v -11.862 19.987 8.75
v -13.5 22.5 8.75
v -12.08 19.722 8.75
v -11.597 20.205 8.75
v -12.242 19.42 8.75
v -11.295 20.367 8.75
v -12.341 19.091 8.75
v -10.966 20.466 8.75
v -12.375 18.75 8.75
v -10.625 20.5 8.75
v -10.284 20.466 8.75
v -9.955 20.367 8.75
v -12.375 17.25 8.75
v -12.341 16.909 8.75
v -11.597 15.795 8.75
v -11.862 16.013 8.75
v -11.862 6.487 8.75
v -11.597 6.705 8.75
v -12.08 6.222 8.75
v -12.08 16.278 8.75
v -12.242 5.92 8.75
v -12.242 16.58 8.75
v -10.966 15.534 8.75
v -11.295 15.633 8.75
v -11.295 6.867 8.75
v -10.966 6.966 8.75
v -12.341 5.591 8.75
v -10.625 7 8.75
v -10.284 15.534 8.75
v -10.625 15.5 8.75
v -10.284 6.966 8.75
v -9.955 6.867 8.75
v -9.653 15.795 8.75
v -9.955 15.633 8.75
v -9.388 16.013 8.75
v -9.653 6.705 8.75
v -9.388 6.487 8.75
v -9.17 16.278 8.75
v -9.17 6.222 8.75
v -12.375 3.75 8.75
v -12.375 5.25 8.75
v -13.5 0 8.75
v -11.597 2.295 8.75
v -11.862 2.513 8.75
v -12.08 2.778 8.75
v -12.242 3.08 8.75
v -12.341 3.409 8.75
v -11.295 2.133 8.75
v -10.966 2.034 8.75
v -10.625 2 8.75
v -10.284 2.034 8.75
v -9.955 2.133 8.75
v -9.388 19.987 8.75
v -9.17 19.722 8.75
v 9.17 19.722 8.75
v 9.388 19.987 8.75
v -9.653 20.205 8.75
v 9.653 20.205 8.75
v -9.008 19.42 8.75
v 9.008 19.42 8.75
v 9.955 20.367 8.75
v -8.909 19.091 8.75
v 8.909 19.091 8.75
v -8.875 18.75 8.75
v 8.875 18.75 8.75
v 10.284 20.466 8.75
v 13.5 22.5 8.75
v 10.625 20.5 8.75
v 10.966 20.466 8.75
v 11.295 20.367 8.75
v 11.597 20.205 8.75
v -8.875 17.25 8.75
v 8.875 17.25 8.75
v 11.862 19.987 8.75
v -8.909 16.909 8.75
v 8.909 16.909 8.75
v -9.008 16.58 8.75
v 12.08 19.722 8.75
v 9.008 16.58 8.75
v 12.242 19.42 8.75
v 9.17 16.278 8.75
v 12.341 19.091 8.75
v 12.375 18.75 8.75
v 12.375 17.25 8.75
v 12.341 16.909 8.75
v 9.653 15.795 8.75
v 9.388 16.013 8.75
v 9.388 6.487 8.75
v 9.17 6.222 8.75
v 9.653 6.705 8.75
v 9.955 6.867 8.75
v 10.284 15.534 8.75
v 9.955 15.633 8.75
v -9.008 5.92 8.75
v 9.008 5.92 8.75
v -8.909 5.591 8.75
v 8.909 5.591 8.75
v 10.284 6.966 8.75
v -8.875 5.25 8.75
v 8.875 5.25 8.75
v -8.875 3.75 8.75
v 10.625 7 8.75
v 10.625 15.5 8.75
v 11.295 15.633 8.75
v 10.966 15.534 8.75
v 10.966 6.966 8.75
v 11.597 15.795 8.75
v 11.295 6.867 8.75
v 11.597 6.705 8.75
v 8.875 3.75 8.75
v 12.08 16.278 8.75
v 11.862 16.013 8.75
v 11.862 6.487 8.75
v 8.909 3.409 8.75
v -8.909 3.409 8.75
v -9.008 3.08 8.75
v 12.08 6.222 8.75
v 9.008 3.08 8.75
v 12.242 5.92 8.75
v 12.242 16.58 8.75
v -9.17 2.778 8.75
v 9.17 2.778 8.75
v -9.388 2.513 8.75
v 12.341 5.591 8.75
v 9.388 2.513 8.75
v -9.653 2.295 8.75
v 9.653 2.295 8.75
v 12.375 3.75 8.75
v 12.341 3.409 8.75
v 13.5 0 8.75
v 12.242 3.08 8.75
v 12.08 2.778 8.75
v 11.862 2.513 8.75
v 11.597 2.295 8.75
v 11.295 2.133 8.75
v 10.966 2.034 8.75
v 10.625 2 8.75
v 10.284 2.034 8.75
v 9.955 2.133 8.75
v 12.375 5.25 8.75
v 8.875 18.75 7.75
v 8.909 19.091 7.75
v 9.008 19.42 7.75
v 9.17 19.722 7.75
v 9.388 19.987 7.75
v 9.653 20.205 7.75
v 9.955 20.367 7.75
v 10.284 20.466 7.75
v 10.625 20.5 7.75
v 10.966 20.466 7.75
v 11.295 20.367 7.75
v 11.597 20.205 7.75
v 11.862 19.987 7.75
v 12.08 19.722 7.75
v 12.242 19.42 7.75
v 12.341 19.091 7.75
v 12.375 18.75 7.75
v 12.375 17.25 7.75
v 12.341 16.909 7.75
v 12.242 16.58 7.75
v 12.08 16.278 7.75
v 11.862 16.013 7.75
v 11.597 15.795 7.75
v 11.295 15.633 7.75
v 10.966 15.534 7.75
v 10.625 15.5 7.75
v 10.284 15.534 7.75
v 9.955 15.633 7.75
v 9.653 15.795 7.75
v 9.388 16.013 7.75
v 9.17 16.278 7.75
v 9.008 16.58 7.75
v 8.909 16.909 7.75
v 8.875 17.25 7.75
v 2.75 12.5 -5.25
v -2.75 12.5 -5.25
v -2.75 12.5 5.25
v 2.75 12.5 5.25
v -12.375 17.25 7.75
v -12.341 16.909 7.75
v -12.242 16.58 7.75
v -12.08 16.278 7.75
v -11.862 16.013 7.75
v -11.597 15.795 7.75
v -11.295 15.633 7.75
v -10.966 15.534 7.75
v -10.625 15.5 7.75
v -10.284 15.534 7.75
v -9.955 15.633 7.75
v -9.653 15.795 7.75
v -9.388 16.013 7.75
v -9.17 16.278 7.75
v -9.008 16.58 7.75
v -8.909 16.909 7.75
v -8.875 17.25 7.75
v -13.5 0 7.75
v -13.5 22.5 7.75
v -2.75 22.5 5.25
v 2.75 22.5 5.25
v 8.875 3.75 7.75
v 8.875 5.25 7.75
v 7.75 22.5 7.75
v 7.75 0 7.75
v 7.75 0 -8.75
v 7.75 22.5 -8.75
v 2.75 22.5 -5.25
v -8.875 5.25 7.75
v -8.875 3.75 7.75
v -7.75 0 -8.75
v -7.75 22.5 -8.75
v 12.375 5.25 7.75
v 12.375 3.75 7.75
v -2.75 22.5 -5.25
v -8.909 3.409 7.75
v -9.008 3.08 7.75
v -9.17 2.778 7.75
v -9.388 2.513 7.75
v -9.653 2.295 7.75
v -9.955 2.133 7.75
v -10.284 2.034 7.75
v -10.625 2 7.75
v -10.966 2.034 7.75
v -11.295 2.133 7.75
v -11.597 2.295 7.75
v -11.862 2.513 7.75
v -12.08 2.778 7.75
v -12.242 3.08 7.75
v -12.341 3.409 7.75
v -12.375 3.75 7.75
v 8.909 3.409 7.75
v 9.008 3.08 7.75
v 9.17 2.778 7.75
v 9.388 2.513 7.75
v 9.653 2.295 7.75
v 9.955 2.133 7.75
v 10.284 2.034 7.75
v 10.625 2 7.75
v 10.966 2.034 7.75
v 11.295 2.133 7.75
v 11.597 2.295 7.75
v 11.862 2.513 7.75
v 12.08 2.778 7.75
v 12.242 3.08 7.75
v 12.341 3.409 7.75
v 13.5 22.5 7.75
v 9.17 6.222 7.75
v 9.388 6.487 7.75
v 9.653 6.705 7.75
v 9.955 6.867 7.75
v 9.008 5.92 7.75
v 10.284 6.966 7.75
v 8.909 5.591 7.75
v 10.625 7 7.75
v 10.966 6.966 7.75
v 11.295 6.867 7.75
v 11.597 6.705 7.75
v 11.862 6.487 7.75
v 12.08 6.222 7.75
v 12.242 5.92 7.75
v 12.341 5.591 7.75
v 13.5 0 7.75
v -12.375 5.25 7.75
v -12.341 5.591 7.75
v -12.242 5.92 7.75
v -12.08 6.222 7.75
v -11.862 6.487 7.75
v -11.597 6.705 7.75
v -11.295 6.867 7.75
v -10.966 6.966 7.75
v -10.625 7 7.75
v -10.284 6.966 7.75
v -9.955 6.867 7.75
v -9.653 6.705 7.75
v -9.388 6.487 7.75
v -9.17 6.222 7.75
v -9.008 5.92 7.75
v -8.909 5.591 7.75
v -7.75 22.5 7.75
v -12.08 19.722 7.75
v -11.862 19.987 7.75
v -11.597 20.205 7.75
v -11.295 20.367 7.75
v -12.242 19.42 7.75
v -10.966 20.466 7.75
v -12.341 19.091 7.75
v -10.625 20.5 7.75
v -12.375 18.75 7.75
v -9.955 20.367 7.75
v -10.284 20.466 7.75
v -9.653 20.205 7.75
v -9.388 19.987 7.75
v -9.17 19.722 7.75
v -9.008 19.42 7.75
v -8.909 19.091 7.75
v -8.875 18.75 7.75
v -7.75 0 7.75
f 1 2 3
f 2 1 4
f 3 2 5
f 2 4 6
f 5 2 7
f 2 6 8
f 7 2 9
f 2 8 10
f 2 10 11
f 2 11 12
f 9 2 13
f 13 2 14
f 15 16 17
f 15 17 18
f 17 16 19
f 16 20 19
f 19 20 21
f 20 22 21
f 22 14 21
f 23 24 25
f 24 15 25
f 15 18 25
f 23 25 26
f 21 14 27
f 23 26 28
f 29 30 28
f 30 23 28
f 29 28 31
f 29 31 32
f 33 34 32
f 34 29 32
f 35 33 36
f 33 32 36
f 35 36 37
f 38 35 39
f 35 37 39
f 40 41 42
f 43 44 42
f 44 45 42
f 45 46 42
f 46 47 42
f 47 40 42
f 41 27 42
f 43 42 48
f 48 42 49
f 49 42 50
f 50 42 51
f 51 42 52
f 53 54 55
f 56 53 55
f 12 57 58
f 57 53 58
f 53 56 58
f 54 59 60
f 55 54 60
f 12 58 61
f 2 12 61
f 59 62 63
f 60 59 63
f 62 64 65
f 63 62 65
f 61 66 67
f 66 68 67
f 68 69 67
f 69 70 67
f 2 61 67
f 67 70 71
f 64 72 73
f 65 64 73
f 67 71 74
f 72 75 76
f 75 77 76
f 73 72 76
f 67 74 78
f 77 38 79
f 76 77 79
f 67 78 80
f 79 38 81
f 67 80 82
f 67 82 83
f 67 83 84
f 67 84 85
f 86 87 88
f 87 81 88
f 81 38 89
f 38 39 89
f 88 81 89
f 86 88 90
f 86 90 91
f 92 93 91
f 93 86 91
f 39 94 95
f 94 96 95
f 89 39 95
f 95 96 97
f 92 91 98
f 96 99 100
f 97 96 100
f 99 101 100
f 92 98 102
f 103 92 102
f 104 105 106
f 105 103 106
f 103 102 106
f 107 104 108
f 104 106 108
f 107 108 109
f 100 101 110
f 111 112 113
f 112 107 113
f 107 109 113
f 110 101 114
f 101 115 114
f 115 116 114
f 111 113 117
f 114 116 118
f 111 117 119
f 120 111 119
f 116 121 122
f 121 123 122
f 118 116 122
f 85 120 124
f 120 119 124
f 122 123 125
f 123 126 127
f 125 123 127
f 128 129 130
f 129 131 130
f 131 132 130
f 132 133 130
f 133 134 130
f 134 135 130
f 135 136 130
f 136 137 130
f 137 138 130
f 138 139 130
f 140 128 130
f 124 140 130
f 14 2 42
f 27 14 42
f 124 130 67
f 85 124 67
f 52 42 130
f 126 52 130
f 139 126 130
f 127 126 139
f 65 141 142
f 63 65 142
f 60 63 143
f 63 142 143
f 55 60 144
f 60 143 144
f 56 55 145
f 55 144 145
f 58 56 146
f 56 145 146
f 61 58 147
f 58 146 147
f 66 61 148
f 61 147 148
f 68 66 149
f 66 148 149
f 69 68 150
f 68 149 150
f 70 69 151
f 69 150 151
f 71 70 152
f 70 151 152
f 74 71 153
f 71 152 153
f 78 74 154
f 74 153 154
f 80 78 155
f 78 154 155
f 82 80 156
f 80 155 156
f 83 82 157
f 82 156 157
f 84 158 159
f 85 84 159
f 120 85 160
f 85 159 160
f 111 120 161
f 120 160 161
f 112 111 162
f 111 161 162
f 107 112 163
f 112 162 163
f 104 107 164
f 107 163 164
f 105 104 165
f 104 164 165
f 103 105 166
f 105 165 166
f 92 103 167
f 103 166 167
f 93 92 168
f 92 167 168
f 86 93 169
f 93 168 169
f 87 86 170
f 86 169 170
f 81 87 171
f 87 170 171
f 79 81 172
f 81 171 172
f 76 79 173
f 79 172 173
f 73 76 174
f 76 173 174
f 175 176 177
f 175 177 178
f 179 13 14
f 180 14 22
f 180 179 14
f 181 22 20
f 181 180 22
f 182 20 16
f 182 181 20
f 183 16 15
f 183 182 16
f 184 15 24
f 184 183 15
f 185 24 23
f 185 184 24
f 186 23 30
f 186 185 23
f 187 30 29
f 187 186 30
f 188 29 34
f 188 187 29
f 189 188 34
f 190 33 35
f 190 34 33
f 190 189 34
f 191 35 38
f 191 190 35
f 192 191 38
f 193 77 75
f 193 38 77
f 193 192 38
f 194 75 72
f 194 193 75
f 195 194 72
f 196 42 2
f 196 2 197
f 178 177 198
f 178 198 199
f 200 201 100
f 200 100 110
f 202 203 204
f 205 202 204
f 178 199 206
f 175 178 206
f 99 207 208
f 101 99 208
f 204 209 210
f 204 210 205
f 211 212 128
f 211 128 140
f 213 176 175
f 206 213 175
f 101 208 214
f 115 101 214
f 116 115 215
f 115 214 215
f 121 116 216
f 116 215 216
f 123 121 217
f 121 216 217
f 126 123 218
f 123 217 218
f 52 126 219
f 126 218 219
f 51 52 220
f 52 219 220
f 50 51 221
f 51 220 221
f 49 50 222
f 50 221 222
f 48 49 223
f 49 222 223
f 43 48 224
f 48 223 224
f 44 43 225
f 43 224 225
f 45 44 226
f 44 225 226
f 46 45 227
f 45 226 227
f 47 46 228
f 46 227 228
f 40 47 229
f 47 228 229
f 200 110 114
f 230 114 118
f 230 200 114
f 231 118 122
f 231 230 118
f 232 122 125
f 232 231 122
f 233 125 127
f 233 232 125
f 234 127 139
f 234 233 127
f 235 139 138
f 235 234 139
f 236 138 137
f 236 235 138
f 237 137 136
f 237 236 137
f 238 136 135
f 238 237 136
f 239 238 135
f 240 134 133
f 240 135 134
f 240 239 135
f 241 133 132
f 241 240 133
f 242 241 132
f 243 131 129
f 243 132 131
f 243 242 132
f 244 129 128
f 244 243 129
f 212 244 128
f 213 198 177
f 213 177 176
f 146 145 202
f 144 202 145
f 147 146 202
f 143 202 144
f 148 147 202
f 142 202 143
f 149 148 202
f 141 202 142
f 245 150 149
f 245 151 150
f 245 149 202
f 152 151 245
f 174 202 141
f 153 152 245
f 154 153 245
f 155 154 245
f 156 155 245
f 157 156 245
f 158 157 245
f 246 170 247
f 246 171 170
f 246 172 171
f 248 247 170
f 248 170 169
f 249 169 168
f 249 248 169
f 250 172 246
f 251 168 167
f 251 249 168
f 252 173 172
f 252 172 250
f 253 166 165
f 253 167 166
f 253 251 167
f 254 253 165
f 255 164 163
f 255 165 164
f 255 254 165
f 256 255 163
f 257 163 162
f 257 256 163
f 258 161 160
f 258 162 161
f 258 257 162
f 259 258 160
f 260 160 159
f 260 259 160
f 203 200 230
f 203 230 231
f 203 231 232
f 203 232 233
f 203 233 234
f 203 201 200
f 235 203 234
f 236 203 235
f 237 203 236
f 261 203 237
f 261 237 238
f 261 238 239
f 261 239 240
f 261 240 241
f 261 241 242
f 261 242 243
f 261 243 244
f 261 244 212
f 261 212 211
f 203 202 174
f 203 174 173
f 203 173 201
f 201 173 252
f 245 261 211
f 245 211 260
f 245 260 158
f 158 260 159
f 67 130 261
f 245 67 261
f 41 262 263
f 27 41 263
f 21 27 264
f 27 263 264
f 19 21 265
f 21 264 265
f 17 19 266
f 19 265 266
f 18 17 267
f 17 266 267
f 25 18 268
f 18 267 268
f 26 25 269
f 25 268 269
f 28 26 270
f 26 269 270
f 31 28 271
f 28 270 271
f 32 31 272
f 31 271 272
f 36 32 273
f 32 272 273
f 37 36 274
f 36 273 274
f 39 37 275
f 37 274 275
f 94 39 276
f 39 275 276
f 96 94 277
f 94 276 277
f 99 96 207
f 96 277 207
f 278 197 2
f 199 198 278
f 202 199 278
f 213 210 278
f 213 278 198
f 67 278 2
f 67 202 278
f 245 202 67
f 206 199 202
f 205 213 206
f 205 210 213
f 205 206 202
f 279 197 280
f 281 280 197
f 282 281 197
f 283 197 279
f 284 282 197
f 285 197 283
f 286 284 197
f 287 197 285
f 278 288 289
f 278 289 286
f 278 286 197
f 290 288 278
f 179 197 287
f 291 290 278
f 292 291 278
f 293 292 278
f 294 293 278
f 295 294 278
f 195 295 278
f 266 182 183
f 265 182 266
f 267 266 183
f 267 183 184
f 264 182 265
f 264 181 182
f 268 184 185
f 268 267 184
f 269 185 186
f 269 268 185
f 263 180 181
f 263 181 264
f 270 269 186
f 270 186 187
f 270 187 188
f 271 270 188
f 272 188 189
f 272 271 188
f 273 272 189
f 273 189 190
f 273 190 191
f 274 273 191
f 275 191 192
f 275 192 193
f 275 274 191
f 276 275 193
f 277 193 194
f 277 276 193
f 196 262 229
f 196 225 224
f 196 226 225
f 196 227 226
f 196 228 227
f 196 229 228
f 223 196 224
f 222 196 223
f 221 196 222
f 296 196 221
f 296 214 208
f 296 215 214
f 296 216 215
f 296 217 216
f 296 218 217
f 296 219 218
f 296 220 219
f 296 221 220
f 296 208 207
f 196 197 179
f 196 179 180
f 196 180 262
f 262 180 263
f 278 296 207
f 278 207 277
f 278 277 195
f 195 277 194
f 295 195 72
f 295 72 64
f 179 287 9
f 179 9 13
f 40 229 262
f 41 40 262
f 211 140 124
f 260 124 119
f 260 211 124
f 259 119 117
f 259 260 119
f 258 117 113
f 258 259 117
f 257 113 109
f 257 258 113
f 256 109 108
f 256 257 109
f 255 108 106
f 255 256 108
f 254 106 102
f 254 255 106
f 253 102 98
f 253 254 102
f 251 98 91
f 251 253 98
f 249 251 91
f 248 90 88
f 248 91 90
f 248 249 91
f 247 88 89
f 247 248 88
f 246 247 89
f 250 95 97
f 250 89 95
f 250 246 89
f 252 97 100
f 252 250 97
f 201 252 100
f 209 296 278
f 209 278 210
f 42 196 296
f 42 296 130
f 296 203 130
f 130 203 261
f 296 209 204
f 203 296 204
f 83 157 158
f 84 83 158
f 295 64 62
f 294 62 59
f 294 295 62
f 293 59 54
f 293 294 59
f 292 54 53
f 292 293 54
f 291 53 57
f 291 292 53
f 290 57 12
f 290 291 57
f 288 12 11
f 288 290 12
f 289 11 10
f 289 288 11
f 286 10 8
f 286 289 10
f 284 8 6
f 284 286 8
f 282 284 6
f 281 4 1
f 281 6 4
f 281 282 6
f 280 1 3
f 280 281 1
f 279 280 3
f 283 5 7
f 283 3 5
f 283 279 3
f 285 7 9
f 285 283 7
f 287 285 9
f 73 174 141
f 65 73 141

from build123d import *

# Parameters (mm, degrees)
SKETCH1_W            = 15.5
SKETCH1_H            = 17.5
SKETCH1_W_2          = 5.75
SKETCH1_H_2          = 1
BOSS_EXTRUDE1_DEPTH  = 22.5
CUT_EXTRUDE1_DEPTH   = 2
MIRROR2_COPY_1_DEPTH = 2
SKETCH3_W            = 5.5
SKETCH3_H            = 10.5
CUT_EXTRUDE2_DEPTH   = 10


with BuildPart() as part:
    # Sketch1 → Boss-Extrude1 (new body)
    with BuildSketch(Plane(origin=(0, 0, 0), x_dir=(1, 0, 0), z_dir=(0, 1, 0))):
        Rectangle(SKETCH1_W, SKETCH1_H)
        with Locations((10.625, -8.25)):
            Rectangle(SKETCH1_W_2, SKETCH1_H_2)
        with Locations((-10.625, -8.25)):
            Rectangle(SKETCH1_W_2, SKETCH1_H_2)
    extrude(amount=BOSS_EXTRUDE1_DEPTH)

    # Sketch2 → Cut-Extrude1 (cut, through all)
    with BuildSketch(Plane(origin=(0, 0, 7.75), x_dir=(-1, 0, 0), z_dir=(0, 0, -1))):
        with BuildLine():
            Line((12.375, 18.75), (12.375, 17.25))
            ThreePointArc((12.375, 17.25), (10.625, 15.5), (8.875, 17.25))
            Line((8.875, 17.25), (8.875, 18.75))
            ThreePointArc((8.875, 18.75), (10.625, 20.5), (12.375, 18.75))
        make_face()
    cut_extrude1 = extrude(amount=-CUT_EXTRUDE1_DEPTH, mode=Mode.SUBTRACT)

    # Mirror1: Cut-Extrude1 across plane
    add(cut_extrude1.mirror(Plane(origin=(0, 0, 0), x_dir=(0, 0, 1), z_dir=(1, 0, 0))), mode=Mode.SUBTRACT)

    # Mirror2: Cut-Extrude1 across plane
    add(cut_extrude1.mirror(Plane.ZX.offset(11.25)), mode=Mode.SUBTRACT)

    # Mirror2 copy 1 sketch → Mirror2 copy 1 (cut, through all)
    with BuildSketch(Plane(origin=(0, 22.5, 7.75), x_dir=(1, 0, 0), z_dir=(0, 0, -1))):
        with BuildLine():
            Line((12.375, 18.75), (12.375, 17.25))
            ThreePointArc((12.375, 17.25), (10.625, 15.5), (8.875, 17.25))
            Line((8.875, 17.25), (8.875, 18.75))
            ThreePointArc((8.875, 18.75), (10.625, 20.5), (12.375, 18.75))
        make_face()
    extrude(amount=-MIRROR2_COPY_1_DEPTH, mode=Mode.SUBTRACT)

    # Sketch3 → Cut-Extrude2 (cut)
    with BuildSketch(Plane(origin=(0, 22.5, 0), x_dir=(1, 0, 0), z_dir=(0, 1, 0))):
        Rectangle(SKETCH3_W, SKETCH3_H)
    extrude(amount=-CUT_EXTRUDE2_DEPTH, mode=Mode.SUBTRACT)


solid = part.part
